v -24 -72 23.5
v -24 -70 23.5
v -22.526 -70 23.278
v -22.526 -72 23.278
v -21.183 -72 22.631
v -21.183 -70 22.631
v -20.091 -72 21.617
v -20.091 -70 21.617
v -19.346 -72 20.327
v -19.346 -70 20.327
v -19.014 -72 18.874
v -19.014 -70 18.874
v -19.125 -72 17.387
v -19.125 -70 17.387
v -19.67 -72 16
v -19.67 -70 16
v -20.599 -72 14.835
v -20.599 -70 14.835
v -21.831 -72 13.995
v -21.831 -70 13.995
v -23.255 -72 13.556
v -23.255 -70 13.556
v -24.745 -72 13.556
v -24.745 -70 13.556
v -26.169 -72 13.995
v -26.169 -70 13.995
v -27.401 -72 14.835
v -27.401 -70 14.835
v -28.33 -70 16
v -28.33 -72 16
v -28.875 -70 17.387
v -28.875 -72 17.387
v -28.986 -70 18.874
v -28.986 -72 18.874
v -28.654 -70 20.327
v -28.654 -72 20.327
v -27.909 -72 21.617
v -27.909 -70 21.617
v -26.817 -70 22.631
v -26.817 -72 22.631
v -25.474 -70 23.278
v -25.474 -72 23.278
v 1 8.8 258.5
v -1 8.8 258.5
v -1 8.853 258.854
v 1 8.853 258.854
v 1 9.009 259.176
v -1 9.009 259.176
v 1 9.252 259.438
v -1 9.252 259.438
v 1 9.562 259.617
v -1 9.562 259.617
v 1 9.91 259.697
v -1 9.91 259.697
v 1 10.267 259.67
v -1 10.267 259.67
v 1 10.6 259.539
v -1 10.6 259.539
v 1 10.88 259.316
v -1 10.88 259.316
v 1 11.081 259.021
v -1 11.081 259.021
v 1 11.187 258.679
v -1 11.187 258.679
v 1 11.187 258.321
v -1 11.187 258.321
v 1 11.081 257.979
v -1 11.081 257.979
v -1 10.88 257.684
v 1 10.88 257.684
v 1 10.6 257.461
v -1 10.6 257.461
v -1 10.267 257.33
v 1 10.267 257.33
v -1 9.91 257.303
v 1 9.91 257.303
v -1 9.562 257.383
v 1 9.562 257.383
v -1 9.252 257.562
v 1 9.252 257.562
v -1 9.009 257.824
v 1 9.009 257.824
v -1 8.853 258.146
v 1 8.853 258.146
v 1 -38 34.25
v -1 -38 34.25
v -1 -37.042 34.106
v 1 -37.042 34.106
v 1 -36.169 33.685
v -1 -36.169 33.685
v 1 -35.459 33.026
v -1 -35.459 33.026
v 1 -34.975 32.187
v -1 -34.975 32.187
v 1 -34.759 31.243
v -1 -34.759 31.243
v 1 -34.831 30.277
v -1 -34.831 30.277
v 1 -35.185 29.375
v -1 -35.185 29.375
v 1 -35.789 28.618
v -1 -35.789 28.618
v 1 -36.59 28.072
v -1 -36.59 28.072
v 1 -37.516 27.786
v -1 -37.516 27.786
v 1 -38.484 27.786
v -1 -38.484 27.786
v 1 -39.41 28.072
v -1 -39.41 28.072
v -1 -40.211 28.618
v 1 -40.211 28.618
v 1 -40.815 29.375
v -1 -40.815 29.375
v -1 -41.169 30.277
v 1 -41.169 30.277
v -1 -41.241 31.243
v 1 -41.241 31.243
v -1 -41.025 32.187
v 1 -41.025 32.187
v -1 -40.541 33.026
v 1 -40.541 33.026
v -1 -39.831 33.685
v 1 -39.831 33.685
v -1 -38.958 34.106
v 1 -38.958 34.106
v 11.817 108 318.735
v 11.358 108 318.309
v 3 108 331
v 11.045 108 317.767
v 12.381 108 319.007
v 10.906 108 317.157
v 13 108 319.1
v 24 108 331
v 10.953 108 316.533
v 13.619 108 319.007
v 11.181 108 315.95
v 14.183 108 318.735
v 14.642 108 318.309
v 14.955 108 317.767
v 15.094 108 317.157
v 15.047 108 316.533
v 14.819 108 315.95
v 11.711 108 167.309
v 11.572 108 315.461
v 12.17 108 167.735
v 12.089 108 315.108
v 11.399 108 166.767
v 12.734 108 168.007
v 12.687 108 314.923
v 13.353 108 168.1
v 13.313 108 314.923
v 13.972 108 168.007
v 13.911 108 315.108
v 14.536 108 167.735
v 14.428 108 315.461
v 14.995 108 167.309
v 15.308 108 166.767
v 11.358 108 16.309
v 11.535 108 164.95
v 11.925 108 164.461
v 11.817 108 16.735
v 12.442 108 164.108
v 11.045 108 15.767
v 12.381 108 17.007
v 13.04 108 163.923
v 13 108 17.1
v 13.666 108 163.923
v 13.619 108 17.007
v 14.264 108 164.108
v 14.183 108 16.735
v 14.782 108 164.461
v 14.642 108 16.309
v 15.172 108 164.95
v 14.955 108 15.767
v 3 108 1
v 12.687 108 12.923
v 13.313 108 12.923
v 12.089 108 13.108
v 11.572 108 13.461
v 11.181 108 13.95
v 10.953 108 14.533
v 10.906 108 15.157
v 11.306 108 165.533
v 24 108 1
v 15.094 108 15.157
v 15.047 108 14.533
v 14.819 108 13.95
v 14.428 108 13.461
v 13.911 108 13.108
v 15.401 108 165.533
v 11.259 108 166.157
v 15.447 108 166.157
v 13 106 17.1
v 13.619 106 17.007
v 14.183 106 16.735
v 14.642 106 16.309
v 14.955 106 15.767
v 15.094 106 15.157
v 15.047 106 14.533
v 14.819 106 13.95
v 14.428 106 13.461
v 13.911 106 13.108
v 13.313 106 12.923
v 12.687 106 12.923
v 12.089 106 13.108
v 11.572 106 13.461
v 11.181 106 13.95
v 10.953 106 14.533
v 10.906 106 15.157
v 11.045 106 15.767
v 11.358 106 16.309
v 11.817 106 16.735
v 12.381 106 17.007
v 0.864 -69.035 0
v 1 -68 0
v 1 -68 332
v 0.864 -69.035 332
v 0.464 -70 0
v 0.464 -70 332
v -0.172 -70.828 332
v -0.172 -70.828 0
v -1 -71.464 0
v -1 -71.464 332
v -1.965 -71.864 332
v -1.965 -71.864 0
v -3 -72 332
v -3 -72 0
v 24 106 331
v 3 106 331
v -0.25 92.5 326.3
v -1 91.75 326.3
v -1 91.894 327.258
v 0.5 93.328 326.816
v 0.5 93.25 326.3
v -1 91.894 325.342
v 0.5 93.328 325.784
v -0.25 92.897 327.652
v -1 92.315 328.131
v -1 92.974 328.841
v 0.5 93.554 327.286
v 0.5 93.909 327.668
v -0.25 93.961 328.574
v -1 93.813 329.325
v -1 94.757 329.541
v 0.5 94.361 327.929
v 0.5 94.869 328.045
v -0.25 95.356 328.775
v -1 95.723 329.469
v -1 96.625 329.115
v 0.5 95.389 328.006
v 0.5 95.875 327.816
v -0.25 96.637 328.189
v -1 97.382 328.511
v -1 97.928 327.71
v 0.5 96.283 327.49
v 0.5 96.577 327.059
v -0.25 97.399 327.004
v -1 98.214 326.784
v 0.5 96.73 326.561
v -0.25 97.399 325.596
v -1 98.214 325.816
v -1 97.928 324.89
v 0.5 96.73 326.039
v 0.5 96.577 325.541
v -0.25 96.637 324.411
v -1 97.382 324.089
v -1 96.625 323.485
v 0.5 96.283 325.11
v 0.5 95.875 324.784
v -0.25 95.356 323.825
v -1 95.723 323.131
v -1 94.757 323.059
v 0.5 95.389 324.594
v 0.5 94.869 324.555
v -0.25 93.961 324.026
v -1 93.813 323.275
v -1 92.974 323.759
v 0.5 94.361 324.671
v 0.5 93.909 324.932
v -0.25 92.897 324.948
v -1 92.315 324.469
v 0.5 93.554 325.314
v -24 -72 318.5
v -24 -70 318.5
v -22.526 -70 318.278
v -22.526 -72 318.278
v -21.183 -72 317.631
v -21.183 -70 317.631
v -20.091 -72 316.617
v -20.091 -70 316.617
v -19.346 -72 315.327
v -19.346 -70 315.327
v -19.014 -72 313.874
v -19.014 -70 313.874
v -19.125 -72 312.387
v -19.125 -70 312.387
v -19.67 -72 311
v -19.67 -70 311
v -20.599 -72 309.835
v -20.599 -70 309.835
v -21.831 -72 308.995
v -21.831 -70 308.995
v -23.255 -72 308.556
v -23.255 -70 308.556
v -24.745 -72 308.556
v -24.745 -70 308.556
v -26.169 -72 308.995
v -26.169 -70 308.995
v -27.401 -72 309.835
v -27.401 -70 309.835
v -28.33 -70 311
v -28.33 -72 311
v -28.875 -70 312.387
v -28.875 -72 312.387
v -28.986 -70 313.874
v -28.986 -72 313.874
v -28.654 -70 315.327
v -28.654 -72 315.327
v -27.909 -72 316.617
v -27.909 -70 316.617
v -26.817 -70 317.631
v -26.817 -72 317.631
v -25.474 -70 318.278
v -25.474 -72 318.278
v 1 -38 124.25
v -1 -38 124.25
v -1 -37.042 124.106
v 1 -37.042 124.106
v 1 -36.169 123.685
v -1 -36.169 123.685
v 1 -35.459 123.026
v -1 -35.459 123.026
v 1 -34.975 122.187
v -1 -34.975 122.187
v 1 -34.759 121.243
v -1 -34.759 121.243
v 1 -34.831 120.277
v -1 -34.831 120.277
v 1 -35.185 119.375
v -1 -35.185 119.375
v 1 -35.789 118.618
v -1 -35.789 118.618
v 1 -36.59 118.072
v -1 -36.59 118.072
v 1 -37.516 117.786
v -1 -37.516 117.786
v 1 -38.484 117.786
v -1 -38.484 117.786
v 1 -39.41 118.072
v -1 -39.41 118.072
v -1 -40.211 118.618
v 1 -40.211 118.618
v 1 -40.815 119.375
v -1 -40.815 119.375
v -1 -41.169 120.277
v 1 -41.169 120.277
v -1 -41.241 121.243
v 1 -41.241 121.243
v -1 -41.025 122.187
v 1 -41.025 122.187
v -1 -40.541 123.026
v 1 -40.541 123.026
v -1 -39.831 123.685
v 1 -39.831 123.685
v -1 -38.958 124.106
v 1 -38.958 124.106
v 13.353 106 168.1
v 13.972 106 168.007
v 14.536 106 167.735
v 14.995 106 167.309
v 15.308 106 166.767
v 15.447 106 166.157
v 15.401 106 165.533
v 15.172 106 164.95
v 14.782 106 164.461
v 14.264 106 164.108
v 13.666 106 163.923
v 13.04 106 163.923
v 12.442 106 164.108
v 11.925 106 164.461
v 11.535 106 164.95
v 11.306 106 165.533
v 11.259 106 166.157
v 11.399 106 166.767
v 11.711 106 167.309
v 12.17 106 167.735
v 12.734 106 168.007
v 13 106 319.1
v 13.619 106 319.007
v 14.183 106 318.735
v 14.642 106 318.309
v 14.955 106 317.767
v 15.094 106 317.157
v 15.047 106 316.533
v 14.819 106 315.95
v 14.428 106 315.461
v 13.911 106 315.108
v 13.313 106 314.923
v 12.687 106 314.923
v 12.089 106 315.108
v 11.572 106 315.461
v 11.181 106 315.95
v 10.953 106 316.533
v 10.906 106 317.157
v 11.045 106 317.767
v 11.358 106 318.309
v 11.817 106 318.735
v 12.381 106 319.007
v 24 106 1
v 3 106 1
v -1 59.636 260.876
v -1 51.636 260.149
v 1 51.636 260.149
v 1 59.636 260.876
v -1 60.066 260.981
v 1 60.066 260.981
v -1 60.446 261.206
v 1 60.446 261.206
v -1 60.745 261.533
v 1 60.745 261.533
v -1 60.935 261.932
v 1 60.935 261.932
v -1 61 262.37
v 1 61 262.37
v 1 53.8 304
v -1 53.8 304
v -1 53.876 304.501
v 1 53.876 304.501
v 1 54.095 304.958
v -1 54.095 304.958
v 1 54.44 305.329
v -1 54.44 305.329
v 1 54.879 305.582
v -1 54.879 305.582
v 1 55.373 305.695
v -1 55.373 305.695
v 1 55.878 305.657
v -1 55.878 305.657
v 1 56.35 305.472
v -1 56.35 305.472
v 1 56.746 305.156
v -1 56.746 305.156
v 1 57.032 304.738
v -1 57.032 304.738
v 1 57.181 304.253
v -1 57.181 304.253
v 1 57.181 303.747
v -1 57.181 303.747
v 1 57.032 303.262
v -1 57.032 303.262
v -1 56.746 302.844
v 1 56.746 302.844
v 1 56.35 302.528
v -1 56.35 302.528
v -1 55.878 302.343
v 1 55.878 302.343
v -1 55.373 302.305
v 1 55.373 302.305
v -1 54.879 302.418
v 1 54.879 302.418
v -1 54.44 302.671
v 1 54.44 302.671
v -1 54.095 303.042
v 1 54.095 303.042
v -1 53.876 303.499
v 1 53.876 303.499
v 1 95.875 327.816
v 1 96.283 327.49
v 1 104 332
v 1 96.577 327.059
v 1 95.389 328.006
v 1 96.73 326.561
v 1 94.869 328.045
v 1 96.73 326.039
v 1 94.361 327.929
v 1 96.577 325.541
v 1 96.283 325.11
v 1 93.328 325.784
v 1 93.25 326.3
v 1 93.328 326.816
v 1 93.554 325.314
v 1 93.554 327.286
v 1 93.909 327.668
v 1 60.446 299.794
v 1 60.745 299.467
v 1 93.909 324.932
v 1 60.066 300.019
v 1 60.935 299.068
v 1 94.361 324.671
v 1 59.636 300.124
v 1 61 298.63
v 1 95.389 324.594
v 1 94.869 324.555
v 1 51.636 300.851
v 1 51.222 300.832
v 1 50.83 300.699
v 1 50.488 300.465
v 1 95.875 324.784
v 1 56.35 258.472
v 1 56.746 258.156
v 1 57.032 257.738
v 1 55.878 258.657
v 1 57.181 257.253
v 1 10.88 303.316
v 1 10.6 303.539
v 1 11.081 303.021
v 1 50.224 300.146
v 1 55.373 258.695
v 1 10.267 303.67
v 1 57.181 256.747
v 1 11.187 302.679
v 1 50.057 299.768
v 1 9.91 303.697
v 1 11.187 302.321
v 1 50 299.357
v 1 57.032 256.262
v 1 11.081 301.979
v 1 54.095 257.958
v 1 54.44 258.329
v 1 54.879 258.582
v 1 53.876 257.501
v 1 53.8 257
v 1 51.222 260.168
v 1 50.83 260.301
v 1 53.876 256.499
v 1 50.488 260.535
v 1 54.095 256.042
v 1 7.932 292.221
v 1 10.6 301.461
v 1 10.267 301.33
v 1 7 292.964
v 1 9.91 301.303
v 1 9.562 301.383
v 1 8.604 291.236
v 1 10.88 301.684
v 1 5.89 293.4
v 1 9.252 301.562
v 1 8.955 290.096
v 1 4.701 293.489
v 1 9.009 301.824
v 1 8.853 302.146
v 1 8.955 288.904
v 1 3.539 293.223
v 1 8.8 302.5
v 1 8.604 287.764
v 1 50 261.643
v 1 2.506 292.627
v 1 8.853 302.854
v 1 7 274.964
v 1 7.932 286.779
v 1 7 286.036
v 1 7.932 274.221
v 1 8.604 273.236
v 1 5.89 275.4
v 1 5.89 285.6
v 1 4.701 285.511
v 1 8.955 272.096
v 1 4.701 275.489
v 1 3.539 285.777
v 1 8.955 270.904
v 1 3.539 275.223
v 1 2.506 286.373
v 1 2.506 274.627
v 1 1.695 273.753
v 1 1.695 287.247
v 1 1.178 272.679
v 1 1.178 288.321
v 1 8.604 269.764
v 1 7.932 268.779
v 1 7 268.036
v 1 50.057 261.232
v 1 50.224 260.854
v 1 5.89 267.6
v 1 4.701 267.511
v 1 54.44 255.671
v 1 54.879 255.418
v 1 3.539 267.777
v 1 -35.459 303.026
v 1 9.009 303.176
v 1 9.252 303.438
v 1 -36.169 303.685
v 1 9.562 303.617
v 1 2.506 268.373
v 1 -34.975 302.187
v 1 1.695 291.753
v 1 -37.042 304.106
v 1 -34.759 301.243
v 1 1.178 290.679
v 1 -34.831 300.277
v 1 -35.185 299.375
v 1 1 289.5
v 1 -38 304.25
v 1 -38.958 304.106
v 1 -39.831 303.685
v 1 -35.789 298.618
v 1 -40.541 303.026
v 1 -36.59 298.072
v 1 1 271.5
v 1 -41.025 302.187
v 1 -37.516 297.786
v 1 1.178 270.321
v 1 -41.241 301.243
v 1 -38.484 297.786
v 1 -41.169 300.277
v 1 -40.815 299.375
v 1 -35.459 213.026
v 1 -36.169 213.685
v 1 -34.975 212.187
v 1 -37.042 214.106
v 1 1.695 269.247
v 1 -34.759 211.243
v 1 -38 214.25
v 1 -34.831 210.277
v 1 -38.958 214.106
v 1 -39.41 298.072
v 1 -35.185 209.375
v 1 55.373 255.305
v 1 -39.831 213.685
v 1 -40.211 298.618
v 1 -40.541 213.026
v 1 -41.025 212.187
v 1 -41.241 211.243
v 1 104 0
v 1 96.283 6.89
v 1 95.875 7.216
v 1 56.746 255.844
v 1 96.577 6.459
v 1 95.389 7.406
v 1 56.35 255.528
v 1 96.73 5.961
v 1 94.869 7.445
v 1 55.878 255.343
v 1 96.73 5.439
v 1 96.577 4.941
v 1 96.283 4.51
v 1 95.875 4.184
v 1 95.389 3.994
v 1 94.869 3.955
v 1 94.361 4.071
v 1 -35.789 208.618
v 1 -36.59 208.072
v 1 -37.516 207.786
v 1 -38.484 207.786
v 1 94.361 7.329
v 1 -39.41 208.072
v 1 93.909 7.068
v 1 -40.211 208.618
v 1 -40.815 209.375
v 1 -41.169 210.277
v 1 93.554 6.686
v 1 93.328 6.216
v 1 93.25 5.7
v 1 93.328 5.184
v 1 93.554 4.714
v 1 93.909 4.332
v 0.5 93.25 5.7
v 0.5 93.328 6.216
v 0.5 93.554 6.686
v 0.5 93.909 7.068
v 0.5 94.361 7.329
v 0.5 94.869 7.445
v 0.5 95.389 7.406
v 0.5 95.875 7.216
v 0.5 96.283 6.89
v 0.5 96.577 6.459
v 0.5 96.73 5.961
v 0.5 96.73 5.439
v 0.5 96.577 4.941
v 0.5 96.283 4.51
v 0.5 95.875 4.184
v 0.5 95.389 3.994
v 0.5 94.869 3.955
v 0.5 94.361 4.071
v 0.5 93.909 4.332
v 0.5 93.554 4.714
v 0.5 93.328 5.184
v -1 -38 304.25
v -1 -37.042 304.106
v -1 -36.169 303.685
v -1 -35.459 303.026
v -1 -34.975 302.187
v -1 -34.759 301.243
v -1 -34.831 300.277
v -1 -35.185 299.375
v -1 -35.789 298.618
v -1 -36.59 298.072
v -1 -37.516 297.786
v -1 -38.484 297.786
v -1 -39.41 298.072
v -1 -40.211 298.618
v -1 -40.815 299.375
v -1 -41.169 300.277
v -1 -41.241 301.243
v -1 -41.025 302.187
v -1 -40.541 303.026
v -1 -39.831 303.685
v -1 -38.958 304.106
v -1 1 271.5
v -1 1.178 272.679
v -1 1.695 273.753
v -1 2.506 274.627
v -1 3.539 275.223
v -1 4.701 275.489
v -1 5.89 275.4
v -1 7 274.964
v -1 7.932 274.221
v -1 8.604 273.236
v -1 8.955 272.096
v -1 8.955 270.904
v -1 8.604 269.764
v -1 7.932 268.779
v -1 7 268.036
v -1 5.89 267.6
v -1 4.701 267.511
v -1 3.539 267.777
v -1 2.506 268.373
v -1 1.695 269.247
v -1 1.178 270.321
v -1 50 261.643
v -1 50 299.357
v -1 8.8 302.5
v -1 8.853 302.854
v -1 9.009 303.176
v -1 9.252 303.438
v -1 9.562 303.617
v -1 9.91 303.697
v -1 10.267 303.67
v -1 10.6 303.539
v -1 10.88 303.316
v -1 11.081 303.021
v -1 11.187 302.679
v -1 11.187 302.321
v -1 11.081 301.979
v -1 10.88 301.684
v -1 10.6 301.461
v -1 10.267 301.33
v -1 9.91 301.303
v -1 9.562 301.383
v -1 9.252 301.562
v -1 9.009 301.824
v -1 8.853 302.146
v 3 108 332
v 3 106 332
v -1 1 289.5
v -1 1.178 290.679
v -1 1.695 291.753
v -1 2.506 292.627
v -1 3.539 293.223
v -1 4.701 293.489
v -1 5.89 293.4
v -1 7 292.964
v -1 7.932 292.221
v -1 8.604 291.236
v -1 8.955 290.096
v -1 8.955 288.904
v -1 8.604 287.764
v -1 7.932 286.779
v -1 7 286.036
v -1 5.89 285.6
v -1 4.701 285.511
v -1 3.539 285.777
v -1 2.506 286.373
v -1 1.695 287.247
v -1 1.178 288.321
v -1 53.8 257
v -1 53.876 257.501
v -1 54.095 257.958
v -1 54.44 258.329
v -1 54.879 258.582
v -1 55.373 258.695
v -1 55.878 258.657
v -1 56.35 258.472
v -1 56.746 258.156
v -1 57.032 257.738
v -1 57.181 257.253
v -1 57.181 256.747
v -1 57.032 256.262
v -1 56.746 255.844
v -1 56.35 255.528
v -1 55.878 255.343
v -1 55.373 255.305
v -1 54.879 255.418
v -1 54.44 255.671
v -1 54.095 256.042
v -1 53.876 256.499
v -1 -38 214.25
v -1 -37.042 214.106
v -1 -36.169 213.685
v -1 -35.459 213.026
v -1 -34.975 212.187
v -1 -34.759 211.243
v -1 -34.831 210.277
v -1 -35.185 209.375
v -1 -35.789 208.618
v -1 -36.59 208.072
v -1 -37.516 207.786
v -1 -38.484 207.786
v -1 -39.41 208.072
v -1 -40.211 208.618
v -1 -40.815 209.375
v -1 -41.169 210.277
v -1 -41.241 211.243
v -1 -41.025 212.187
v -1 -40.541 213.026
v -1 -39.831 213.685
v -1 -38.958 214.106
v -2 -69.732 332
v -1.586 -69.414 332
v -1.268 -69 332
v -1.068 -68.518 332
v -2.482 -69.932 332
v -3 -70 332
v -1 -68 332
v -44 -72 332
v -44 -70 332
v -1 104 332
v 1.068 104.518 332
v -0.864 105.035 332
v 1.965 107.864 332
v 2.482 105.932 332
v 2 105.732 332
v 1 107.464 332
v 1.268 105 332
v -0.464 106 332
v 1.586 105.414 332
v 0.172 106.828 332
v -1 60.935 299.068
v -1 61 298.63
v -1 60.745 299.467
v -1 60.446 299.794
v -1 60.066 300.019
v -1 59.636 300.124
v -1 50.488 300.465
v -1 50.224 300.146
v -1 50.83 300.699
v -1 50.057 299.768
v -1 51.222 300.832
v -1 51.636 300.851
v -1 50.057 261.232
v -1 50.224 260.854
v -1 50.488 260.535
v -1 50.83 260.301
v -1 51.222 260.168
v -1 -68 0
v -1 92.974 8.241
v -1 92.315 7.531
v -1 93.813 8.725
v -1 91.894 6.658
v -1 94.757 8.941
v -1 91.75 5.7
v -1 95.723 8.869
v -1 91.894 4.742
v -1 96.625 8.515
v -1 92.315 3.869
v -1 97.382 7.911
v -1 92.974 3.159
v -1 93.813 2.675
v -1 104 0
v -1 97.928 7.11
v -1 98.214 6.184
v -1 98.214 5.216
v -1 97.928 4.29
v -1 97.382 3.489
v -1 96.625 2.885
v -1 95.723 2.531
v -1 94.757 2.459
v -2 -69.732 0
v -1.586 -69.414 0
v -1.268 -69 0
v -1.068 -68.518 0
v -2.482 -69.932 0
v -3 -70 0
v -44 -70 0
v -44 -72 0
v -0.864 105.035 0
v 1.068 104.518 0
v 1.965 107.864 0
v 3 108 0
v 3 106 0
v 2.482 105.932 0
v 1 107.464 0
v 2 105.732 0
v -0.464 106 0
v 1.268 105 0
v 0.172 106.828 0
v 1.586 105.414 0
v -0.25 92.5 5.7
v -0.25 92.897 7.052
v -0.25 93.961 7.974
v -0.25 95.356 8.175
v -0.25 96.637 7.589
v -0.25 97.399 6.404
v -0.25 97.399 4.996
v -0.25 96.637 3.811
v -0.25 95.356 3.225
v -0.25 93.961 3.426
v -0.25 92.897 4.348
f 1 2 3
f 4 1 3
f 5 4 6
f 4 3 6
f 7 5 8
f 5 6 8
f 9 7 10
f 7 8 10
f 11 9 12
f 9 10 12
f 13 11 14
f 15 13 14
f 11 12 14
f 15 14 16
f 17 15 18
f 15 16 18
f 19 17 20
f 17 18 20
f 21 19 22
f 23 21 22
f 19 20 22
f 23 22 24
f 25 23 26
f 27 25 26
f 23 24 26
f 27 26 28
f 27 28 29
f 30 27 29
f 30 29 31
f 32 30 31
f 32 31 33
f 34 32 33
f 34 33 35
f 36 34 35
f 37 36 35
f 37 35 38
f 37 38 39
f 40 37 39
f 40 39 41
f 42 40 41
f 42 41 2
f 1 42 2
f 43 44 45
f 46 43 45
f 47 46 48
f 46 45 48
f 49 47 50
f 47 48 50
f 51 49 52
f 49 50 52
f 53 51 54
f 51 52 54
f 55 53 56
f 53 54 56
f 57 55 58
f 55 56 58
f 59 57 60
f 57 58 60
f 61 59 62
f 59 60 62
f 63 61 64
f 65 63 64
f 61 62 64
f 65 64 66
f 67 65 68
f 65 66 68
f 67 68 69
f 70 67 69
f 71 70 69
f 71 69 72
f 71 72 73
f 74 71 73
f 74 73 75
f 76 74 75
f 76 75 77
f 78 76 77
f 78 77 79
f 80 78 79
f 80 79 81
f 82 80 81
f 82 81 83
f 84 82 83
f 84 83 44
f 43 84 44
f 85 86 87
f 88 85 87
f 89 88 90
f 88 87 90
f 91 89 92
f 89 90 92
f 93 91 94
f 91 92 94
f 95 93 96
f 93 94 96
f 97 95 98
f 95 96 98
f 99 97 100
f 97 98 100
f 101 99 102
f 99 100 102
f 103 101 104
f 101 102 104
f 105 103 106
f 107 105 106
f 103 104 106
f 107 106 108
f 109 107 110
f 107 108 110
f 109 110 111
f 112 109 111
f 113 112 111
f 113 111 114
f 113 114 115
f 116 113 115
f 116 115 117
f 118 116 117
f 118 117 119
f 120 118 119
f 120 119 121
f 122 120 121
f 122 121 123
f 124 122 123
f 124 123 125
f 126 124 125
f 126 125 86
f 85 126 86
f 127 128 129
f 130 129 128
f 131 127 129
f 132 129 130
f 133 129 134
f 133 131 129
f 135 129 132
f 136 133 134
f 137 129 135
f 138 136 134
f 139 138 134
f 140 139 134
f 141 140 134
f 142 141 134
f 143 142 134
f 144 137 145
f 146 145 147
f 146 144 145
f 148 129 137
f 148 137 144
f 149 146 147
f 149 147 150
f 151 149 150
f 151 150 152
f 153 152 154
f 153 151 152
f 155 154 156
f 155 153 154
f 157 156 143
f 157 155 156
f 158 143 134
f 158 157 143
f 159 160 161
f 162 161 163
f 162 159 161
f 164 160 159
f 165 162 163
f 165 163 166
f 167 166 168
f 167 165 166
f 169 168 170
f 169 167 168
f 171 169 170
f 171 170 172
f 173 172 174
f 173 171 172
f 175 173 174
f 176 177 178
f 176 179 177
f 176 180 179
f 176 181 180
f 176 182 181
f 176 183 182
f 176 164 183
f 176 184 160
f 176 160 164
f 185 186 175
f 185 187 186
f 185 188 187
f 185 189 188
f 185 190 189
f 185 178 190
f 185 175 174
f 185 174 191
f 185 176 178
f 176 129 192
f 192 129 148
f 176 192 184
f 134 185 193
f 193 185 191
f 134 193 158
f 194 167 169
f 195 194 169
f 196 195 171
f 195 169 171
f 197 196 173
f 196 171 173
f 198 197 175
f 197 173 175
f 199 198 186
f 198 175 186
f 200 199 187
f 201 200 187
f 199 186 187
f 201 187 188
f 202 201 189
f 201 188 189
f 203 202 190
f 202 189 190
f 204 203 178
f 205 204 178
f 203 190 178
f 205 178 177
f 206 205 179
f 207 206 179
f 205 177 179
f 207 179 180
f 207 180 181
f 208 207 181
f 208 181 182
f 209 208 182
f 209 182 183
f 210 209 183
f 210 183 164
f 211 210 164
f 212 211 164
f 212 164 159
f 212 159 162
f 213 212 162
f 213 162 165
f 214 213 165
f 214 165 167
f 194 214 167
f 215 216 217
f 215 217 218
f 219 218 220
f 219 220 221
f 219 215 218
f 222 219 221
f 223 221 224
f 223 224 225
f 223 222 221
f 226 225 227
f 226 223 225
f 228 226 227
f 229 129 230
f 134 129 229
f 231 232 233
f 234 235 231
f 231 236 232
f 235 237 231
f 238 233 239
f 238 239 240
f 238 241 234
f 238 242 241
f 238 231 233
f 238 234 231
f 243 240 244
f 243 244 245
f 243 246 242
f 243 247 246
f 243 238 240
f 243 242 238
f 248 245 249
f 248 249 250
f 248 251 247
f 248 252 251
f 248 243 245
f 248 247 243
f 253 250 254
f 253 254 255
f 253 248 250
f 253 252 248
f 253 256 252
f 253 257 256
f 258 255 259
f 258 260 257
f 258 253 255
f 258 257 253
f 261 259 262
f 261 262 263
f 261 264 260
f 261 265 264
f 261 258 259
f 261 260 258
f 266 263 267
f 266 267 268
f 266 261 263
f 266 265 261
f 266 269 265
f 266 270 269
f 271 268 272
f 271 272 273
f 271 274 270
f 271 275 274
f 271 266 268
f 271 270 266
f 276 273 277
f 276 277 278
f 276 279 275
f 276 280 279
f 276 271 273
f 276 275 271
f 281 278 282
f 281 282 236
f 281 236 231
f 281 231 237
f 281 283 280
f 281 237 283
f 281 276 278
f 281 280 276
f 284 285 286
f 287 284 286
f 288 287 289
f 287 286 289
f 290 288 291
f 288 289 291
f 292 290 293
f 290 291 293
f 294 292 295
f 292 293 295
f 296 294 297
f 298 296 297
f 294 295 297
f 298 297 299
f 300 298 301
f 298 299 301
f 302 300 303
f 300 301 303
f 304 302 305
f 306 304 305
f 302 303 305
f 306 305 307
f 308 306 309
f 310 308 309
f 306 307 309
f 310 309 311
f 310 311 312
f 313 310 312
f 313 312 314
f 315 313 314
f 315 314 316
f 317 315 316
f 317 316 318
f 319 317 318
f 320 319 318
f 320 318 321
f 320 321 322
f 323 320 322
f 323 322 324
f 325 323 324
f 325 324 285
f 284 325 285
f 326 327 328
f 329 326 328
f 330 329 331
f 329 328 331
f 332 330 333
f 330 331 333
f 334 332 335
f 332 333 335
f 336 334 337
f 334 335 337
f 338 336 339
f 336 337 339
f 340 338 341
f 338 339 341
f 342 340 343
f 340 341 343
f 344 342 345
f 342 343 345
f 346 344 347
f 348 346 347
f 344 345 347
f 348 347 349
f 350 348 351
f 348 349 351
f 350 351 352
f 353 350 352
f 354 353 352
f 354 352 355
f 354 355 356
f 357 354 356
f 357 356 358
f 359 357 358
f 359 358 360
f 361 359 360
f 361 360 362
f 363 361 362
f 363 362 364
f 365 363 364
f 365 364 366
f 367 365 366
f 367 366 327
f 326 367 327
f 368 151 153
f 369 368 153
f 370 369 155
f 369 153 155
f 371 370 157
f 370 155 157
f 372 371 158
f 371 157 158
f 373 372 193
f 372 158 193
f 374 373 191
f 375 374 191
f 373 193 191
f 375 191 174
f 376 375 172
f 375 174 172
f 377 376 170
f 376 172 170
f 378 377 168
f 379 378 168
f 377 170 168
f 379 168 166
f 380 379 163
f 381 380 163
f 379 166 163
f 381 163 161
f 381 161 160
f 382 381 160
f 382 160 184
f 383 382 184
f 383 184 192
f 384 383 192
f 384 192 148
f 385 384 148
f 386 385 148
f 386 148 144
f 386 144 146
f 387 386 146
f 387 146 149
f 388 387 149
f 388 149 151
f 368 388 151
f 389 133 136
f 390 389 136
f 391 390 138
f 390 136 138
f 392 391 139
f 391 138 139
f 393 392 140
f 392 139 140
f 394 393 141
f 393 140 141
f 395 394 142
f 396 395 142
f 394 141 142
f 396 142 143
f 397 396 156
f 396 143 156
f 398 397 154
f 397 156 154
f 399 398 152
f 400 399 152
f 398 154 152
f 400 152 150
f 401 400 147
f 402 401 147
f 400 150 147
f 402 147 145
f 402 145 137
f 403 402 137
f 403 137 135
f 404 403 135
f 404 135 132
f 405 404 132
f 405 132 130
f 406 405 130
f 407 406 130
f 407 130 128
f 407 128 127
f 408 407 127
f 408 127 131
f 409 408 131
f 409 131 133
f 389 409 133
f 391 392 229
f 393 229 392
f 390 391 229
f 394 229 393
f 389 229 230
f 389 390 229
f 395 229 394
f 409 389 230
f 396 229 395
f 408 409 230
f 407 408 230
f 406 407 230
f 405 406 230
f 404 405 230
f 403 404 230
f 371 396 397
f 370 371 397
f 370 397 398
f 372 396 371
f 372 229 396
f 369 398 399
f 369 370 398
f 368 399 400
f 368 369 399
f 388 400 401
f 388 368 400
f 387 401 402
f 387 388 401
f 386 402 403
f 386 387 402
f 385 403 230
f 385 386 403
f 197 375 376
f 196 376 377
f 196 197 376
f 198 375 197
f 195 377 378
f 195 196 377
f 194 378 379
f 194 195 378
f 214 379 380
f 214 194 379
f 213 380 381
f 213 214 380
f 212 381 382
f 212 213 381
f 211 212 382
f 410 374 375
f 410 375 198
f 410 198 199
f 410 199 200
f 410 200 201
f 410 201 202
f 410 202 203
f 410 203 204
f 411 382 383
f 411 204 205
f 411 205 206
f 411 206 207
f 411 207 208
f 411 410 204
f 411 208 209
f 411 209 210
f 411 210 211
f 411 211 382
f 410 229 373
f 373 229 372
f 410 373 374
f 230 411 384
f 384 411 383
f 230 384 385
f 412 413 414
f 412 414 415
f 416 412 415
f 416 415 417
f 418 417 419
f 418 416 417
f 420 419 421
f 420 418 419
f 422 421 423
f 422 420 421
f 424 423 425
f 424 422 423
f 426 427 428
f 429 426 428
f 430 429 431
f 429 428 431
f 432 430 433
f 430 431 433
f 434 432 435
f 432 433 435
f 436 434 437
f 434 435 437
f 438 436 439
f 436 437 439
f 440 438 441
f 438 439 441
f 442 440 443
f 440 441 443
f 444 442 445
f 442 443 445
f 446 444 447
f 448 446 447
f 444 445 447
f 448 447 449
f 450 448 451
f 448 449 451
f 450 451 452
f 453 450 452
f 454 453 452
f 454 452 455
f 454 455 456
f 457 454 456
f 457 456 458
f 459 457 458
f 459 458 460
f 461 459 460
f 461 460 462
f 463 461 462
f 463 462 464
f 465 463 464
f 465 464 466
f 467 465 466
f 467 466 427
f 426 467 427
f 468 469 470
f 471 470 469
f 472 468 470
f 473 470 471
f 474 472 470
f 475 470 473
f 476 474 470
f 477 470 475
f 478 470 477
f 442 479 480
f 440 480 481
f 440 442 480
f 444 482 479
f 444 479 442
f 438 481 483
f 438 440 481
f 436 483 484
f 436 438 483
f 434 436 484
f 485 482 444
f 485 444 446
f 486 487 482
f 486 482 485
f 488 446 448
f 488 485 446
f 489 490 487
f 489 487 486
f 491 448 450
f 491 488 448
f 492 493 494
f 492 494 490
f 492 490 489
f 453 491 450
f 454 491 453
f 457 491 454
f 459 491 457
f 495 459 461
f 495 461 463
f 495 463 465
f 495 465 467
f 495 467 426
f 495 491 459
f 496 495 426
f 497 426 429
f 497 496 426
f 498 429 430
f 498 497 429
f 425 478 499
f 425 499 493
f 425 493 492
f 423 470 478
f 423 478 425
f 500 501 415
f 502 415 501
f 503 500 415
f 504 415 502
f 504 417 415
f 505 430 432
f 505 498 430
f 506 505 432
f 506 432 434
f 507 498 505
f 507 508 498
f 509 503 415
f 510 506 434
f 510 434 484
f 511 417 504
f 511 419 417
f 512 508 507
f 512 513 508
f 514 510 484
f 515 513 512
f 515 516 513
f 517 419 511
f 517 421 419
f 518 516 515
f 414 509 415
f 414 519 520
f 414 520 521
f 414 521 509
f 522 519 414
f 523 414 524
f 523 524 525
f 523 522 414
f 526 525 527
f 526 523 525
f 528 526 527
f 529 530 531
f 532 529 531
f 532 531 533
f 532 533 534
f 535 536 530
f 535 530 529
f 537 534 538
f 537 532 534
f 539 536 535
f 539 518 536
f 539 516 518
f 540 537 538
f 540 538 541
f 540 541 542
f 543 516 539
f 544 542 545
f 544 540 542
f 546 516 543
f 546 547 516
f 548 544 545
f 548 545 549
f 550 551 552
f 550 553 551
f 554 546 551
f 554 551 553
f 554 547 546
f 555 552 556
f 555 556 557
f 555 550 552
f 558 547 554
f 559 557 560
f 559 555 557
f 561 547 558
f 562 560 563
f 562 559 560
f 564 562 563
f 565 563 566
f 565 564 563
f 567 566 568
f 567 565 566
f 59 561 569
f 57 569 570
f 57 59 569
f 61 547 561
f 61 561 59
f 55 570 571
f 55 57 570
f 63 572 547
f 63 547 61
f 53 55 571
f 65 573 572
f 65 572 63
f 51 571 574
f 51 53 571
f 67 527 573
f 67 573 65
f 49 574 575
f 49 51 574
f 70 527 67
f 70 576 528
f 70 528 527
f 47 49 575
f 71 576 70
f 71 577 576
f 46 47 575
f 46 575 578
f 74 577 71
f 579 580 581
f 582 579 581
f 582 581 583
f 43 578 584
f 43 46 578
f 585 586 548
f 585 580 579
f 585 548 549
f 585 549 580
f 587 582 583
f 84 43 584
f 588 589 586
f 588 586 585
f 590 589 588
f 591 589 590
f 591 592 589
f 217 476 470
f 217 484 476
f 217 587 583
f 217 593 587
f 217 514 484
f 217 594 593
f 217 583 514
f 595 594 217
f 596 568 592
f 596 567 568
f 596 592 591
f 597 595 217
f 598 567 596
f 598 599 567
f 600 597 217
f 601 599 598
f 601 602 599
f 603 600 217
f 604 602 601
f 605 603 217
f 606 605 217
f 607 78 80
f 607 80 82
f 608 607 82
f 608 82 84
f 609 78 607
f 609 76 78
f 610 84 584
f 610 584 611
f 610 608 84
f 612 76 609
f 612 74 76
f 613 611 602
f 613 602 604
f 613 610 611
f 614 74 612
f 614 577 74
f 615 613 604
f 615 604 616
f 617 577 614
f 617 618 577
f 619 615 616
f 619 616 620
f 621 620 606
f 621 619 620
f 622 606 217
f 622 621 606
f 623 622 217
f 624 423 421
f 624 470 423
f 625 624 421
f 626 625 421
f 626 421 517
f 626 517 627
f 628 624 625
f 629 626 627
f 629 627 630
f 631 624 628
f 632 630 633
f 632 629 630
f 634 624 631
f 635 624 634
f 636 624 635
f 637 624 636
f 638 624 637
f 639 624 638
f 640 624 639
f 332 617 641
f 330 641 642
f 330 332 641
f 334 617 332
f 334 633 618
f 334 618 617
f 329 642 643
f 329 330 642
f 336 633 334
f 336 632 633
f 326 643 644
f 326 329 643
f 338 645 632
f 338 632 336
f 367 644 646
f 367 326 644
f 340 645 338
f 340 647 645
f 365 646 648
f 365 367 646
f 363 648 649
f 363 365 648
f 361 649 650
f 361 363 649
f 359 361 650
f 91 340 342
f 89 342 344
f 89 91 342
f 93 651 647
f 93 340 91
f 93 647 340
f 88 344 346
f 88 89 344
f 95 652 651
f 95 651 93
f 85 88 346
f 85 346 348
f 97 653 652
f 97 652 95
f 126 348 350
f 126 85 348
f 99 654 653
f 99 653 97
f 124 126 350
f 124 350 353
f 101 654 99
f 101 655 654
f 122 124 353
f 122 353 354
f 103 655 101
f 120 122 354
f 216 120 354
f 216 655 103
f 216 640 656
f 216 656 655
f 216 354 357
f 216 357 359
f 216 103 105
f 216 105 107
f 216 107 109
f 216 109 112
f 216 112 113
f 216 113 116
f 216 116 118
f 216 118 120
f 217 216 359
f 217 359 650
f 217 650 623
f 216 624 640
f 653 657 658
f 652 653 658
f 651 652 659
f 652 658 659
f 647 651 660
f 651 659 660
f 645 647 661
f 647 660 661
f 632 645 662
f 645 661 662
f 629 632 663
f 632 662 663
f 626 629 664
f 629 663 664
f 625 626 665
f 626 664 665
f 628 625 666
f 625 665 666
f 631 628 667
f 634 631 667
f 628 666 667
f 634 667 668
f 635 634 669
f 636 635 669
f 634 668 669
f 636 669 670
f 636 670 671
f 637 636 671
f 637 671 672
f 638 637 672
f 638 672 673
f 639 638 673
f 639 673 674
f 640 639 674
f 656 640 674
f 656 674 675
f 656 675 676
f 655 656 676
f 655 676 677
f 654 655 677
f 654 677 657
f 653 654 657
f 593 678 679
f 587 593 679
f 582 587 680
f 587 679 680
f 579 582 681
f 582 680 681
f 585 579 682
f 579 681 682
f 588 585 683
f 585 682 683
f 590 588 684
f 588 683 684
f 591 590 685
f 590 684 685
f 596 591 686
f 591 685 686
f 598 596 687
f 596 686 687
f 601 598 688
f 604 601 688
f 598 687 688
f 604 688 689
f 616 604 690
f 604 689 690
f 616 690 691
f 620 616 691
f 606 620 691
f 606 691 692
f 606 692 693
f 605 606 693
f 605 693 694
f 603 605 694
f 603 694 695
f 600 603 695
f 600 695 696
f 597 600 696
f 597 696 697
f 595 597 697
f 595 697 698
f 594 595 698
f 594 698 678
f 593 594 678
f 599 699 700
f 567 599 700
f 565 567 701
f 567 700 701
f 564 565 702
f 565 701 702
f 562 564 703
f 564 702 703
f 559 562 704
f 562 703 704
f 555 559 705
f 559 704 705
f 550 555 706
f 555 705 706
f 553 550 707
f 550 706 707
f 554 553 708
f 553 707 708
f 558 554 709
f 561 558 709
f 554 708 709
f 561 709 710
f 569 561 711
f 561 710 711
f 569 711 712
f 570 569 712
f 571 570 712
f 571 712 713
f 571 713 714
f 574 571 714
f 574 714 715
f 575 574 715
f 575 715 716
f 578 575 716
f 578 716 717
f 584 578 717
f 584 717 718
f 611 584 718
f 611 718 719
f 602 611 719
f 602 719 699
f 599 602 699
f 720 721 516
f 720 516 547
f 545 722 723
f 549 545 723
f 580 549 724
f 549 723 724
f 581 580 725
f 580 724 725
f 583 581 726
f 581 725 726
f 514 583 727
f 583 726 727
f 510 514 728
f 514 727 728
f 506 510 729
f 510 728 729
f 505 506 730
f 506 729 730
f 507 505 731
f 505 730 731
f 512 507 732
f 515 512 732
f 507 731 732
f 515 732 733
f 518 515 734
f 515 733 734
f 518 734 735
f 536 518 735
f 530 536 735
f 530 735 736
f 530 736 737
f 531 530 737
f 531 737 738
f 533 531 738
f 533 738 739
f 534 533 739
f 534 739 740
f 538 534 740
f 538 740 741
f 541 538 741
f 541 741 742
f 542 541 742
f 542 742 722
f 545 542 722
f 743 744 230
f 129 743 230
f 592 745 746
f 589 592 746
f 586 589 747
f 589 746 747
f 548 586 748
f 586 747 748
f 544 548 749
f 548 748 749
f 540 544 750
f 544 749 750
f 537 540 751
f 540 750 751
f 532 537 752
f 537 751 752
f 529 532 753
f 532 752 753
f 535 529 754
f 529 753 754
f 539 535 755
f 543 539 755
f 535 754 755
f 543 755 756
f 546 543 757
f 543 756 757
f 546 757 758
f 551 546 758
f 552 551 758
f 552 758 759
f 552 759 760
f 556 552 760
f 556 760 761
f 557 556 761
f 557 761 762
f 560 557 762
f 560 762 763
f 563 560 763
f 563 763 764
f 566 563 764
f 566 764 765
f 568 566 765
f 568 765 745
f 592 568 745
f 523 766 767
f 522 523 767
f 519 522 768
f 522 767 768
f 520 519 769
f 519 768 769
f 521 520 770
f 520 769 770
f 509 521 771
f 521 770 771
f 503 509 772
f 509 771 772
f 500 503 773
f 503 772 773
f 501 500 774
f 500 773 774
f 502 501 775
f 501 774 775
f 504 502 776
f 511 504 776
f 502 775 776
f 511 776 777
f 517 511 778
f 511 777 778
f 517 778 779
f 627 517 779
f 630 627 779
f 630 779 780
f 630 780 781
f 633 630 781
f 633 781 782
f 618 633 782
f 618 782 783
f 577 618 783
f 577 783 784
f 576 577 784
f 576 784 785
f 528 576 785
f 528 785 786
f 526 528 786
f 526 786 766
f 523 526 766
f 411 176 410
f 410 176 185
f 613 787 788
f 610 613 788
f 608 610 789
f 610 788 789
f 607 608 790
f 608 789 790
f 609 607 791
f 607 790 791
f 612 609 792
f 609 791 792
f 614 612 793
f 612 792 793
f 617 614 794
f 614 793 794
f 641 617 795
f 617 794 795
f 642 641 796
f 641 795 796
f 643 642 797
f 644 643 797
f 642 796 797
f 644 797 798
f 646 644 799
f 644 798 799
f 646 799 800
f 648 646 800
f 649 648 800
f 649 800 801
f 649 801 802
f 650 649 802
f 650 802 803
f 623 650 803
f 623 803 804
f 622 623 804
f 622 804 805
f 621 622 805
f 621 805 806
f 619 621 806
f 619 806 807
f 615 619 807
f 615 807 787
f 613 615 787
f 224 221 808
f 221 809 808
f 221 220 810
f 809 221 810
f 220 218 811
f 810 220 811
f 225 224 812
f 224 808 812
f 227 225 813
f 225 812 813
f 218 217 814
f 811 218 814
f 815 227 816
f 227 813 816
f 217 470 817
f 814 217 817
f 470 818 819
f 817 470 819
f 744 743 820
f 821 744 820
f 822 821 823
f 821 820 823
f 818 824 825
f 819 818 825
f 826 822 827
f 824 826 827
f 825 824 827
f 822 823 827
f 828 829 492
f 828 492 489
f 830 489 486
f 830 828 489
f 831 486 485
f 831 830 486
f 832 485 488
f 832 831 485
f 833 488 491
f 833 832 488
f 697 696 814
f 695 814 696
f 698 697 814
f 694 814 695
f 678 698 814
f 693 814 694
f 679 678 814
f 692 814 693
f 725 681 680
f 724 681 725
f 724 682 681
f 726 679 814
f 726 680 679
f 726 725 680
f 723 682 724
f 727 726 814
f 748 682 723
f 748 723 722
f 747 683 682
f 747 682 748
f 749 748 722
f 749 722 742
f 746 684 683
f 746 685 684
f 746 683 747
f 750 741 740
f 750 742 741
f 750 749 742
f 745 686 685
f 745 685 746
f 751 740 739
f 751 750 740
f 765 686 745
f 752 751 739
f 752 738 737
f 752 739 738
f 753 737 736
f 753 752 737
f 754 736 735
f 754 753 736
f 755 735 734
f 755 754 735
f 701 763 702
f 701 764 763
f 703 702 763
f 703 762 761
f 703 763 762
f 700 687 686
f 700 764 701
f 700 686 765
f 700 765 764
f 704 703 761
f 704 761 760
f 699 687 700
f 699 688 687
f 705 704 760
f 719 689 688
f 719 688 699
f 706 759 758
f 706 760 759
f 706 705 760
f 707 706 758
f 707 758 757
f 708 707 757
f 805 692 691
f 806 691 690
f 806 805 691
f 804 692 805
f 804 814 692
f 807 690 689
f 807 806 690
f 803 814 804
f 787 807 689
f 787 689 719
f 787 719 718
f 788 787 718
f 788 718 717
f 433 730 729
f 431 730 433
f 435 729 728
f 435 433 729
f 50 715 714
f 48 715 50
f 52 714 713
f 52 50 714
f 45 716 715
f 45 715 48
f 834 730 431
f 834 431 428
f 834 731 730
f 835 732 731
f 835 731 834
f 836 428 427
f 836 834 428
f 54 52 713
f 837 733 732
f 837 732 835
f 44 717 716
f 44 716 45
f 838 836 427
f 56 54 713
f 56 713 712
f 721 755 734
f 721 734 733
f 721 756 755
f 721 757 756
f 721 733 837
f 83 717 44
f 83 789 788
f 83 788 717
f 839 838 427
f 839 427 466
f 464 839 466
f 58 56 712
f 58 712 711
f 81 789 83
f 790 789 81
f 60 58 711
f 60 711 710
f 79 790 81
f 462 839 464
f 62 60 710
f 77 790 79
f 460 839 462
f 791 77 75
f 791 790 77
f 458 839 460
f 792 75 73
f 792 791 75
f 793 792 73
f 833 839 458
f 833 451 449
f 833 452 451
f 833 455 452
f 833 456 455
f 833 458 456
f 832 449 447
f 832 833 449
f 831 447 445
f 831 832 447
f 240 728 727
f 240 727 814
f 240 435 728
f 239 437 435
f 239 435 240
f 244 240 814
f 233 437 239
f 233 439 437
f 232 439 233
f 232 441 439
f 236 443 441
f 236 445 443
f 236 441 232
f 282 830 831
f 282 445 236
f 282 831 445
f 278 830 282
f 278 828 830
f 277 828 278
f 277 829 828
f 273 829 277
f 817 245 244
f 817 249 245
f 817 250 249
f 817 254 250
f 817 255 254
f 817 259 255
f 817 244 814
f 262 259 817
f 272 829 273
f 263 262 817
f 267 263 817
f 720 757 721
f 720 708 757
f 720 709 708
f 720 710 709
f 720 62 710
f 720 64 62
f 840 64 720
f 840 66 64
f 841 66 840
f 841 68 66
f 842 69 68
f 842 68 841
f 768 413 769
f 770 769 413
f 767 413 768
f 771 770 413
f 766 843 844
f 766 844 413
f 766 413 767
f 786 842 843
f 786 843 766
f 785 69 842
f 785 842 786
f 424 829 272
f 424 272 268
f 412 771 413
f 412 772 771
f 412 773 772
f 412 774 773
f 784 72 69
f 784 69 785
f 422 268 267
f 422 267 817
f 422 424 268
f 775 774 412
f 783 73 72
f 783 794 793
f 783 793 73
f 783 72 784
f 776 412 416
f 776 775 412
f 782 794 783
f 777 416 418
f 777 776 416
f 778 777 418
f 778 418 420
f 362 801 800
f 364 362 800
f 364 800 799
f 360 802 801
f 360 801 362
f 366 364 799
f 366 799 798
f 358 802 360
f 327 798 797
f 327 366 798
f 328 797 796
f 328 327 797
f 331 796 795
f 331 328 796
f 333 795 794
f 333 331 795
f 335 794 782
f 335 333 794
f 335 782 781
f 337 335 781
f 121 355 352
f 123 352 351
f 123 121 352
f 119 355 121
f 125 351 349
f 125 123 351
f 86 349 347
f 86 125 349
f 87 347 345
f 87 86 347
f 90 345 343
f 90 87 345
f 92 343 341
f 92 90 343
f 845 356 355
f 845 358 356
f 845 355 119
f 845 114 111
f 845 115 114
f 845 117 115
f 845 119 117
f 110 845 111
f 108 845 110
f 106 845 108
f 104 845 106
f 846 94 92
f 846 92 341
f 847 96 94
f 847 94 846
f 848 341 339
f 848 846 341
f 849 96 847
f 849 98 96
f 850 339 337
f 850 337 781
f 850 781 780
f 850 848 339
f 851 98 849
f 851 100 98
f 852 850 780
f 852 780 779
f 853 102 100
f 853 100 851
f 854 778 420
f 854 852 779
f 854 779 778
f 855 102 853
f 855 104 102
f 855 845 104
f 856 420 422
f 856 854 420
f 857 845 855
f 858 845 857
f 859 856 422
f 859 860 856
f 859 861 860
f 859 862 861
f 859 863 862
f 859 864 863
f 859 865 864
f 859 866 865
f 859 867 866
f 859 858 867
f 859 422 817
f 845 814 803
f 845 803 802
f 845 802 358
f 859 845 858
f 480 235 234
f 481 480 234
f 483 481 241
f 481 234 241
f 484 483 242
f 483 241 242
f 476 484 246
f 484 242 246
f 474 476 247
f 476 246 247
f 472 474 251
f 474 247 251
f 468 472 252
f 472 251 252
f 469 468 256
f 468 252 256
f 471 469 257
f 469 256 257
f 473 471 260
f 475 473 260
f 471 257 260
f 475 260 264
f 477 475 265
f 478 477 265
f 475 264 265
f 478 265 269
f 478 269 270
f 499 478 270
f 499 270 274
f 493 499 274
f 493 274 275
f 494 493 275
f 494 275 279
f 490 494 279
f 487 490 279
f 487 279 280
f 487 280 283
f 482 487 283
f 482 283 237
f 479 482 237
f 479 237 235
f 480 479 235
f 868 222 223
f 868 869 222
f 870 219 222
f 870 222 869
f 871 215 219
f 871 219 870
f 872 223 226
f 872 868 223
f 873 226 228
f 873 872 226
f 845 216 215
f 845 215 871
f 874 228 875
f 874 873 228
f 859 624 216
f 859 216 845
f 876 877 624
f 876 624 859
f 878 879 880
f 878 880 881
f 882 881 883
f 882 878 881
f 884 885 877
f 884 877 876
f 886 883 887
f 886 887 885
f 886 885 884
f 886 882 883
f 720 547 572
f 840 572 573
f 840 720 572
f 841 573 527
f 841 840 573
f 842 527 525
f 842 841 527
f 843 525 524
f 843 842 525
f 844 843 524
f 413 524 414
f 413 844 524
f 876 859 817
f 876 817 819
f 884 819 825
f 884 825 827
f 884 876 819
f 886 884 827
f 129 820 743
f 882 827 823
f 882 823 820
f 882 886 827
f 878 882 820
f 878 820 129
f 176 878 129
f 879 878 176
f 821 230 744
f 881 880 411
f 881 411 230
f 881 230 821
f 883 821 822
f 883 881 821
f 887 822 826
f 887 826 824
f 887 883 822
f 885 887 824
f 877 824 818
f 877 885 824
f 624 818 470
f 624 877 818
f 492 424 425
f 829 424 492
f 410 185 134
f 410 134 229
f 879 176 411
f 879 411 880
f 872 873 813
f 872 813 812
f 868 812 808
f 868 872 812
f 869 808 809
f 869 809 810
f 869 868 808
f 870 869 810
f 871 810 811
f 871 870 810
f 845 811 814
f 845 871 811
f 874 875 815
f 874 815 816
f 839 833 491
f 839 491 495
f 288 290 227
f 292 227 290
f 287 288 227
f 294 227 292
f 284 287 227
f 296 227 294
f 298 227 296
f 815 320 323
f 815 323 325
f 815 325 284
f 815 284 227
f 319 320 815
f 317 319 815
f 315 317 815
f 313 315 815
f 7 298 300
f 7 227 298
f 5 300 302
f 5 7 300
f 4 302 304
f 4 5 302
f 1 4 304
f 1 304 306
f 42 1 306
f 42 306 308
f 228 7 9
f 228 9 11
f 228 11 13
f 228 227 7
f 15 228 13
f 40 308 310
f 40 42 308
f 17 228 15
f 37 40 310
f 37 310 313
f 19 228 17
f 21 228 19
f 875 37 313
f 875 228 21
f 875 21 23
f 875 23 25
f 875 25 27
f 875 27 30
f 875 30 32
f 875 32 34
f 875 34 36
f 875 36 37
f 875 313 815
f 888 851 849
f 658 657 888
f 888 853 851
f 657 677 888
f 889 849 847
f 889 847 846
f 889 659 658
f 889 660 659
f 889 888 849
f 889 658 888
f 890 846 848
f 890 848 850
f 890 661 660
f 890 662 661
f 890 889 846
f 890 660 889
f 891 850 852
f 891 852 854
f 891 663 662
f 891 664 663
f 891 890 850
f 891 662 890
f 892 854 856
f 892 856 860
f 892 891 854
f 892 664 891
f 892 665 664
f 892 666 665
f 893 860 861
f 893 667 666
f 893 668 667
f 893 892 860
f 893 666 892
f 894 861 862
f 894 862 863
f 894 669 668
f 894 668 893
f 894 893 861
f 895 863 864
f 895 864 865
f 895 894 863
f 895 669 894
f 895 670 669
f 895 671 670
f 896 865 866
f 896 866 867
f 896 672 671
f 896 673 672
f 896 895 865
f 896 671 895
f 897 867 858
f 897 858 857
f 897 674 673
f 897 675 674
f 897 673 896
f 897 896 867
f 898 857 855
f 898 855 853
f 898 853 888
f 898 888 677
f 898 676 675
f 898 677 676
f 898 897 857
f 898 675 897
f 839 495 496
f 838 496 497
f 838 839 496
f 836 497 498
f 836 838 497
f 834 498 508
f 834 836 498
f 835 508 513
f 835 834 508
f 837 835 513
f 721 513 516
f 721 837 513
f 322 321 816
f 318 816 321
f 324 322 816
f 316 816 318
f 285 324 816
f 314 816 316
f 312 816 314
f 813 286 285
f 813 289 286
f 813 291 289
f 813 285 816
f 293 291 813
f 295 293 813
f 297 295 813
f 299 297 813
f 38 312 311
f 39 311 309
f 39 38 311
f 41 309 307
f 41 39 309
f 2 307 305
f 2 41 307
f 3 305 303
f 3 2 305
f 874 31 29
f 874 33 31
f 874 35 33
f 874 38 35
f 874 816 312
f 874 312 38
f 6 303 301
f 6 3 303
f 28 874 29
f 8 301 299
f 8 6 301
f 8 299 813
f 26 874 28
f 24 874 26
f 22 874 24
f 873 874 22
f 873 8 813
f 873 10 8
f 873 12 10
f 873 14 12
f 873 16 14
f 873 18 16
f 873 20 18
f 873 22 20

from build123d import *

# Parameters (mm, degrees)
EXTRUDE_1_DEPTH     = 332
SKETCH_2_R          = 3.25
CUT_EXTRUDE_1_DEPTH = 5
SKETCH_3_R          = 5
CUT_EXTRUDE_2_DEPTH = 5
SKETCH_4_W          = 26.179083289
SKETCH_4_H          = 3.25731829
CUT_EXTRUDE_3_DEPTH = 10
SKETCH_5_R          = 1.75
CUT_EXTRUDE_4_DEPTH = 2.5
CHAMFER_1_SIZE      = 1.5
SKETCH_6_R          = 1.7
SKETCH_6_R_2        = 1.2
SKETCH_6_R_3        = 4
CUT_EXTRUDE_5_DEPTH = 10
SKETCH_7_R          = 2.1
CUT_EXTRUDE_6_DEPTH = 10


with BuildPart() as part:
    # Эскиз1 → Вытянуть1 (new body)
    with BuildSketch(Plane.XY):
        with BuildLine():
            Line((-1, -68), (-1, 104))
            ThreePointArc((-1, 104), (0.171572875, 106.828427125), (3, 108))
            Line((3, 108), (24, 108))
            Line((24, 108), (24, 106))
            Line((24, 106), (3, 106))
            ThreePointArc((3, 106), (1.585786438, 105.414213562), (1, 104))
            Line((1, 104), (1, -68))
            ThreePointArc((1, -68), (-0.171572875, -70.828427125), (-3, -72))
            Line((-3, -72), (-44, -72))
            Line((-44, -72), (-44, -70))
            Line((-44, -70), (-3, -70))
            ThreePointArc((-3, -70), (-1.585786438, -69.414213562), (-1, -68))
        make_face()
    extrude(amount=EXTRUDE_1_DEPTH)

    # Эскиз2 → Вырез-Вытянуть1 (cut)
    with BuildSketch(Plane.ZY.offset(1)):
        with Locations((31, -38)):
            Circle(SKETCH_2_R)
        with Locations((121, -38)):
            Circle(SKETCH_2_R)
        with Locations((211, -38)):
            Circle(SKETCH_2_R)
        with Locations((301, -38)):
            Circle(SKETCH_2_R)
    extrude(amount=-CUT_EXTRUDE_1_DEPTH, mode=Mode.SUBTRACT)

    # Эскиз3 → Вырез-Вытянуть2 (cut)
    with BuildSketch(Plane(origin=(0, -70, 0), x_dir=(1, 0, 0), z_dir=(0, 1, 0))):
        with Locations(Location((-24, -18.5, 0), (0, 0, 270))):
            Circle(SKETCH_3_R)
        with Locations(Location((-24, -313.5, 0), (0, 0, 270))):
            Circle(SKETCH_3_R)
    extrude(amount=-CUT_EXTRUDE_2_DEPTH, mode=Mode.SUBTRACT)

    # Эскиз4 → Вырез-Вытянуть3 (cut)
    with BuildSketch(Plane(origin=(0, 108, 0), x_dir=(1, 0, 0), z_dir=(0, 1, 0))):
        with Locations((16.089541645, 0.628659145)):
            Rectangle(SKETCH_4_W, SKETCH_4_H)
        with Locations((16.089541645, -332.628659145)):
            Rectangle(SKETCH_4_W, SKETCH_4_H)
    extrude(amount=-CUT_EXTRUDE_3_DEPTH, mode=Mode.SUBTRACT)

    # Эскиз5 → Вырез-Вытянуть4 (cut)
    with BuildSketch(Plane.ZY.offset(1)):
        with Locations(Location((5.7, 95, 0), (0, 0, 270))):
            Circle(SKETCH_5_R)
        with Locations(Location((326.3, 95, 0), (0, 0, 270))):
            Circle(SKETCH_5_R)
    extrude(amount=-CUT_EXTRUDE_4_DEPTH, mode=Mode.SUBTRACT)

    # Фаска1
    chamfer_1_edges = [part.edges().sort_by_distance(p)[0] for p in [
        (-1, 96.75, 326.3),
        (-1, 96.75, 5.7),
    ]]
    chamfer(chamfer_1_edges, length=CHAMFER_1_SIZE)

    # Эскиз6 → Вырез-Вытянуть5 (cut)
    with BuildSketch(Plane.ZY.offset(1)):
        with Locations(Location((257, 55.5, 0), (0, 0, 270))):
            Circle(SKETCH_6_R)
        with Locations(Location((304, 55.5, 0), (0, 0, 270))):
            Circle(SKETCH_6_R)
        with Locations(Location((258.5, 10, 0), (0, 0, 270))):
            Circle(SKETCH_6_R_2)
        with Locations(Location((302.5, 10, 0), (0, 0, 270))):
            Circle(SKETCH_6_R_2)
        with Locations(Location((271.5, 5, 0), (0, 0, 270))):
            Circle(SKETCH_6_R_3)
        with Locations(Location((289.5, 5, 0), (0, 0, 270))):
            Circle(SKETCH_6_R_3)
        with BuildLine():
            Line((260.14870942, 51.635803619), (260.875982147, 59.635803619))
            ThreePointArc((260.875982147, 59.635803619), (261.358314525, 60.607633836), (262.369821957, 61))
            Line((262.369821957, 61), (298.630178043, 61))
            ThreePointArc((298.630178043, 61), (299.641685475, 60.607633836), (300.124017853, 59.635803619))
            Line((300.124017853, 59.635803619), (300.85129058, 51.635803619))
            ThreePointArc((300.85129058, 51.635803619), (300.465084606, 50.488492568), (299.35745077, 50))
            Line((299.35745077, 50), (261.64254923, 50))
            ThreePointArc((261.64254923, 50), (260.534915394, 50.488492568), (260.14870942, 51.635803619))
        make_face()
    extrude(amount=-CUT_EXTRUDE_5_DEPTH, mode=Mode.SUBTRACT)

    # Эскиз7 → Вырез-Вытянуть6 (cut)
    with BuildSketch(Plane(origin=(0, 108, 0), x_dir=(1, 0, 0), z_dir=(0, 1, 0))):
        with Locations(Location((13.353335267, -166, 0), (0, 0, 270))):
            Circle(SKETCH_7_R)
        with Locations(Location((13, -15, 0), (0, 0, 270))):
            Circle(SKETCH_7_R)
        with Locations(Location((13, -317, 0), (0, 0, 270))):
            Circle(SKETCH_7_R)
    extrude(amount=-CUT_EXTRUDE_6_DEPTH, mode=Mode.SUBTRACT)


solid = part.part
